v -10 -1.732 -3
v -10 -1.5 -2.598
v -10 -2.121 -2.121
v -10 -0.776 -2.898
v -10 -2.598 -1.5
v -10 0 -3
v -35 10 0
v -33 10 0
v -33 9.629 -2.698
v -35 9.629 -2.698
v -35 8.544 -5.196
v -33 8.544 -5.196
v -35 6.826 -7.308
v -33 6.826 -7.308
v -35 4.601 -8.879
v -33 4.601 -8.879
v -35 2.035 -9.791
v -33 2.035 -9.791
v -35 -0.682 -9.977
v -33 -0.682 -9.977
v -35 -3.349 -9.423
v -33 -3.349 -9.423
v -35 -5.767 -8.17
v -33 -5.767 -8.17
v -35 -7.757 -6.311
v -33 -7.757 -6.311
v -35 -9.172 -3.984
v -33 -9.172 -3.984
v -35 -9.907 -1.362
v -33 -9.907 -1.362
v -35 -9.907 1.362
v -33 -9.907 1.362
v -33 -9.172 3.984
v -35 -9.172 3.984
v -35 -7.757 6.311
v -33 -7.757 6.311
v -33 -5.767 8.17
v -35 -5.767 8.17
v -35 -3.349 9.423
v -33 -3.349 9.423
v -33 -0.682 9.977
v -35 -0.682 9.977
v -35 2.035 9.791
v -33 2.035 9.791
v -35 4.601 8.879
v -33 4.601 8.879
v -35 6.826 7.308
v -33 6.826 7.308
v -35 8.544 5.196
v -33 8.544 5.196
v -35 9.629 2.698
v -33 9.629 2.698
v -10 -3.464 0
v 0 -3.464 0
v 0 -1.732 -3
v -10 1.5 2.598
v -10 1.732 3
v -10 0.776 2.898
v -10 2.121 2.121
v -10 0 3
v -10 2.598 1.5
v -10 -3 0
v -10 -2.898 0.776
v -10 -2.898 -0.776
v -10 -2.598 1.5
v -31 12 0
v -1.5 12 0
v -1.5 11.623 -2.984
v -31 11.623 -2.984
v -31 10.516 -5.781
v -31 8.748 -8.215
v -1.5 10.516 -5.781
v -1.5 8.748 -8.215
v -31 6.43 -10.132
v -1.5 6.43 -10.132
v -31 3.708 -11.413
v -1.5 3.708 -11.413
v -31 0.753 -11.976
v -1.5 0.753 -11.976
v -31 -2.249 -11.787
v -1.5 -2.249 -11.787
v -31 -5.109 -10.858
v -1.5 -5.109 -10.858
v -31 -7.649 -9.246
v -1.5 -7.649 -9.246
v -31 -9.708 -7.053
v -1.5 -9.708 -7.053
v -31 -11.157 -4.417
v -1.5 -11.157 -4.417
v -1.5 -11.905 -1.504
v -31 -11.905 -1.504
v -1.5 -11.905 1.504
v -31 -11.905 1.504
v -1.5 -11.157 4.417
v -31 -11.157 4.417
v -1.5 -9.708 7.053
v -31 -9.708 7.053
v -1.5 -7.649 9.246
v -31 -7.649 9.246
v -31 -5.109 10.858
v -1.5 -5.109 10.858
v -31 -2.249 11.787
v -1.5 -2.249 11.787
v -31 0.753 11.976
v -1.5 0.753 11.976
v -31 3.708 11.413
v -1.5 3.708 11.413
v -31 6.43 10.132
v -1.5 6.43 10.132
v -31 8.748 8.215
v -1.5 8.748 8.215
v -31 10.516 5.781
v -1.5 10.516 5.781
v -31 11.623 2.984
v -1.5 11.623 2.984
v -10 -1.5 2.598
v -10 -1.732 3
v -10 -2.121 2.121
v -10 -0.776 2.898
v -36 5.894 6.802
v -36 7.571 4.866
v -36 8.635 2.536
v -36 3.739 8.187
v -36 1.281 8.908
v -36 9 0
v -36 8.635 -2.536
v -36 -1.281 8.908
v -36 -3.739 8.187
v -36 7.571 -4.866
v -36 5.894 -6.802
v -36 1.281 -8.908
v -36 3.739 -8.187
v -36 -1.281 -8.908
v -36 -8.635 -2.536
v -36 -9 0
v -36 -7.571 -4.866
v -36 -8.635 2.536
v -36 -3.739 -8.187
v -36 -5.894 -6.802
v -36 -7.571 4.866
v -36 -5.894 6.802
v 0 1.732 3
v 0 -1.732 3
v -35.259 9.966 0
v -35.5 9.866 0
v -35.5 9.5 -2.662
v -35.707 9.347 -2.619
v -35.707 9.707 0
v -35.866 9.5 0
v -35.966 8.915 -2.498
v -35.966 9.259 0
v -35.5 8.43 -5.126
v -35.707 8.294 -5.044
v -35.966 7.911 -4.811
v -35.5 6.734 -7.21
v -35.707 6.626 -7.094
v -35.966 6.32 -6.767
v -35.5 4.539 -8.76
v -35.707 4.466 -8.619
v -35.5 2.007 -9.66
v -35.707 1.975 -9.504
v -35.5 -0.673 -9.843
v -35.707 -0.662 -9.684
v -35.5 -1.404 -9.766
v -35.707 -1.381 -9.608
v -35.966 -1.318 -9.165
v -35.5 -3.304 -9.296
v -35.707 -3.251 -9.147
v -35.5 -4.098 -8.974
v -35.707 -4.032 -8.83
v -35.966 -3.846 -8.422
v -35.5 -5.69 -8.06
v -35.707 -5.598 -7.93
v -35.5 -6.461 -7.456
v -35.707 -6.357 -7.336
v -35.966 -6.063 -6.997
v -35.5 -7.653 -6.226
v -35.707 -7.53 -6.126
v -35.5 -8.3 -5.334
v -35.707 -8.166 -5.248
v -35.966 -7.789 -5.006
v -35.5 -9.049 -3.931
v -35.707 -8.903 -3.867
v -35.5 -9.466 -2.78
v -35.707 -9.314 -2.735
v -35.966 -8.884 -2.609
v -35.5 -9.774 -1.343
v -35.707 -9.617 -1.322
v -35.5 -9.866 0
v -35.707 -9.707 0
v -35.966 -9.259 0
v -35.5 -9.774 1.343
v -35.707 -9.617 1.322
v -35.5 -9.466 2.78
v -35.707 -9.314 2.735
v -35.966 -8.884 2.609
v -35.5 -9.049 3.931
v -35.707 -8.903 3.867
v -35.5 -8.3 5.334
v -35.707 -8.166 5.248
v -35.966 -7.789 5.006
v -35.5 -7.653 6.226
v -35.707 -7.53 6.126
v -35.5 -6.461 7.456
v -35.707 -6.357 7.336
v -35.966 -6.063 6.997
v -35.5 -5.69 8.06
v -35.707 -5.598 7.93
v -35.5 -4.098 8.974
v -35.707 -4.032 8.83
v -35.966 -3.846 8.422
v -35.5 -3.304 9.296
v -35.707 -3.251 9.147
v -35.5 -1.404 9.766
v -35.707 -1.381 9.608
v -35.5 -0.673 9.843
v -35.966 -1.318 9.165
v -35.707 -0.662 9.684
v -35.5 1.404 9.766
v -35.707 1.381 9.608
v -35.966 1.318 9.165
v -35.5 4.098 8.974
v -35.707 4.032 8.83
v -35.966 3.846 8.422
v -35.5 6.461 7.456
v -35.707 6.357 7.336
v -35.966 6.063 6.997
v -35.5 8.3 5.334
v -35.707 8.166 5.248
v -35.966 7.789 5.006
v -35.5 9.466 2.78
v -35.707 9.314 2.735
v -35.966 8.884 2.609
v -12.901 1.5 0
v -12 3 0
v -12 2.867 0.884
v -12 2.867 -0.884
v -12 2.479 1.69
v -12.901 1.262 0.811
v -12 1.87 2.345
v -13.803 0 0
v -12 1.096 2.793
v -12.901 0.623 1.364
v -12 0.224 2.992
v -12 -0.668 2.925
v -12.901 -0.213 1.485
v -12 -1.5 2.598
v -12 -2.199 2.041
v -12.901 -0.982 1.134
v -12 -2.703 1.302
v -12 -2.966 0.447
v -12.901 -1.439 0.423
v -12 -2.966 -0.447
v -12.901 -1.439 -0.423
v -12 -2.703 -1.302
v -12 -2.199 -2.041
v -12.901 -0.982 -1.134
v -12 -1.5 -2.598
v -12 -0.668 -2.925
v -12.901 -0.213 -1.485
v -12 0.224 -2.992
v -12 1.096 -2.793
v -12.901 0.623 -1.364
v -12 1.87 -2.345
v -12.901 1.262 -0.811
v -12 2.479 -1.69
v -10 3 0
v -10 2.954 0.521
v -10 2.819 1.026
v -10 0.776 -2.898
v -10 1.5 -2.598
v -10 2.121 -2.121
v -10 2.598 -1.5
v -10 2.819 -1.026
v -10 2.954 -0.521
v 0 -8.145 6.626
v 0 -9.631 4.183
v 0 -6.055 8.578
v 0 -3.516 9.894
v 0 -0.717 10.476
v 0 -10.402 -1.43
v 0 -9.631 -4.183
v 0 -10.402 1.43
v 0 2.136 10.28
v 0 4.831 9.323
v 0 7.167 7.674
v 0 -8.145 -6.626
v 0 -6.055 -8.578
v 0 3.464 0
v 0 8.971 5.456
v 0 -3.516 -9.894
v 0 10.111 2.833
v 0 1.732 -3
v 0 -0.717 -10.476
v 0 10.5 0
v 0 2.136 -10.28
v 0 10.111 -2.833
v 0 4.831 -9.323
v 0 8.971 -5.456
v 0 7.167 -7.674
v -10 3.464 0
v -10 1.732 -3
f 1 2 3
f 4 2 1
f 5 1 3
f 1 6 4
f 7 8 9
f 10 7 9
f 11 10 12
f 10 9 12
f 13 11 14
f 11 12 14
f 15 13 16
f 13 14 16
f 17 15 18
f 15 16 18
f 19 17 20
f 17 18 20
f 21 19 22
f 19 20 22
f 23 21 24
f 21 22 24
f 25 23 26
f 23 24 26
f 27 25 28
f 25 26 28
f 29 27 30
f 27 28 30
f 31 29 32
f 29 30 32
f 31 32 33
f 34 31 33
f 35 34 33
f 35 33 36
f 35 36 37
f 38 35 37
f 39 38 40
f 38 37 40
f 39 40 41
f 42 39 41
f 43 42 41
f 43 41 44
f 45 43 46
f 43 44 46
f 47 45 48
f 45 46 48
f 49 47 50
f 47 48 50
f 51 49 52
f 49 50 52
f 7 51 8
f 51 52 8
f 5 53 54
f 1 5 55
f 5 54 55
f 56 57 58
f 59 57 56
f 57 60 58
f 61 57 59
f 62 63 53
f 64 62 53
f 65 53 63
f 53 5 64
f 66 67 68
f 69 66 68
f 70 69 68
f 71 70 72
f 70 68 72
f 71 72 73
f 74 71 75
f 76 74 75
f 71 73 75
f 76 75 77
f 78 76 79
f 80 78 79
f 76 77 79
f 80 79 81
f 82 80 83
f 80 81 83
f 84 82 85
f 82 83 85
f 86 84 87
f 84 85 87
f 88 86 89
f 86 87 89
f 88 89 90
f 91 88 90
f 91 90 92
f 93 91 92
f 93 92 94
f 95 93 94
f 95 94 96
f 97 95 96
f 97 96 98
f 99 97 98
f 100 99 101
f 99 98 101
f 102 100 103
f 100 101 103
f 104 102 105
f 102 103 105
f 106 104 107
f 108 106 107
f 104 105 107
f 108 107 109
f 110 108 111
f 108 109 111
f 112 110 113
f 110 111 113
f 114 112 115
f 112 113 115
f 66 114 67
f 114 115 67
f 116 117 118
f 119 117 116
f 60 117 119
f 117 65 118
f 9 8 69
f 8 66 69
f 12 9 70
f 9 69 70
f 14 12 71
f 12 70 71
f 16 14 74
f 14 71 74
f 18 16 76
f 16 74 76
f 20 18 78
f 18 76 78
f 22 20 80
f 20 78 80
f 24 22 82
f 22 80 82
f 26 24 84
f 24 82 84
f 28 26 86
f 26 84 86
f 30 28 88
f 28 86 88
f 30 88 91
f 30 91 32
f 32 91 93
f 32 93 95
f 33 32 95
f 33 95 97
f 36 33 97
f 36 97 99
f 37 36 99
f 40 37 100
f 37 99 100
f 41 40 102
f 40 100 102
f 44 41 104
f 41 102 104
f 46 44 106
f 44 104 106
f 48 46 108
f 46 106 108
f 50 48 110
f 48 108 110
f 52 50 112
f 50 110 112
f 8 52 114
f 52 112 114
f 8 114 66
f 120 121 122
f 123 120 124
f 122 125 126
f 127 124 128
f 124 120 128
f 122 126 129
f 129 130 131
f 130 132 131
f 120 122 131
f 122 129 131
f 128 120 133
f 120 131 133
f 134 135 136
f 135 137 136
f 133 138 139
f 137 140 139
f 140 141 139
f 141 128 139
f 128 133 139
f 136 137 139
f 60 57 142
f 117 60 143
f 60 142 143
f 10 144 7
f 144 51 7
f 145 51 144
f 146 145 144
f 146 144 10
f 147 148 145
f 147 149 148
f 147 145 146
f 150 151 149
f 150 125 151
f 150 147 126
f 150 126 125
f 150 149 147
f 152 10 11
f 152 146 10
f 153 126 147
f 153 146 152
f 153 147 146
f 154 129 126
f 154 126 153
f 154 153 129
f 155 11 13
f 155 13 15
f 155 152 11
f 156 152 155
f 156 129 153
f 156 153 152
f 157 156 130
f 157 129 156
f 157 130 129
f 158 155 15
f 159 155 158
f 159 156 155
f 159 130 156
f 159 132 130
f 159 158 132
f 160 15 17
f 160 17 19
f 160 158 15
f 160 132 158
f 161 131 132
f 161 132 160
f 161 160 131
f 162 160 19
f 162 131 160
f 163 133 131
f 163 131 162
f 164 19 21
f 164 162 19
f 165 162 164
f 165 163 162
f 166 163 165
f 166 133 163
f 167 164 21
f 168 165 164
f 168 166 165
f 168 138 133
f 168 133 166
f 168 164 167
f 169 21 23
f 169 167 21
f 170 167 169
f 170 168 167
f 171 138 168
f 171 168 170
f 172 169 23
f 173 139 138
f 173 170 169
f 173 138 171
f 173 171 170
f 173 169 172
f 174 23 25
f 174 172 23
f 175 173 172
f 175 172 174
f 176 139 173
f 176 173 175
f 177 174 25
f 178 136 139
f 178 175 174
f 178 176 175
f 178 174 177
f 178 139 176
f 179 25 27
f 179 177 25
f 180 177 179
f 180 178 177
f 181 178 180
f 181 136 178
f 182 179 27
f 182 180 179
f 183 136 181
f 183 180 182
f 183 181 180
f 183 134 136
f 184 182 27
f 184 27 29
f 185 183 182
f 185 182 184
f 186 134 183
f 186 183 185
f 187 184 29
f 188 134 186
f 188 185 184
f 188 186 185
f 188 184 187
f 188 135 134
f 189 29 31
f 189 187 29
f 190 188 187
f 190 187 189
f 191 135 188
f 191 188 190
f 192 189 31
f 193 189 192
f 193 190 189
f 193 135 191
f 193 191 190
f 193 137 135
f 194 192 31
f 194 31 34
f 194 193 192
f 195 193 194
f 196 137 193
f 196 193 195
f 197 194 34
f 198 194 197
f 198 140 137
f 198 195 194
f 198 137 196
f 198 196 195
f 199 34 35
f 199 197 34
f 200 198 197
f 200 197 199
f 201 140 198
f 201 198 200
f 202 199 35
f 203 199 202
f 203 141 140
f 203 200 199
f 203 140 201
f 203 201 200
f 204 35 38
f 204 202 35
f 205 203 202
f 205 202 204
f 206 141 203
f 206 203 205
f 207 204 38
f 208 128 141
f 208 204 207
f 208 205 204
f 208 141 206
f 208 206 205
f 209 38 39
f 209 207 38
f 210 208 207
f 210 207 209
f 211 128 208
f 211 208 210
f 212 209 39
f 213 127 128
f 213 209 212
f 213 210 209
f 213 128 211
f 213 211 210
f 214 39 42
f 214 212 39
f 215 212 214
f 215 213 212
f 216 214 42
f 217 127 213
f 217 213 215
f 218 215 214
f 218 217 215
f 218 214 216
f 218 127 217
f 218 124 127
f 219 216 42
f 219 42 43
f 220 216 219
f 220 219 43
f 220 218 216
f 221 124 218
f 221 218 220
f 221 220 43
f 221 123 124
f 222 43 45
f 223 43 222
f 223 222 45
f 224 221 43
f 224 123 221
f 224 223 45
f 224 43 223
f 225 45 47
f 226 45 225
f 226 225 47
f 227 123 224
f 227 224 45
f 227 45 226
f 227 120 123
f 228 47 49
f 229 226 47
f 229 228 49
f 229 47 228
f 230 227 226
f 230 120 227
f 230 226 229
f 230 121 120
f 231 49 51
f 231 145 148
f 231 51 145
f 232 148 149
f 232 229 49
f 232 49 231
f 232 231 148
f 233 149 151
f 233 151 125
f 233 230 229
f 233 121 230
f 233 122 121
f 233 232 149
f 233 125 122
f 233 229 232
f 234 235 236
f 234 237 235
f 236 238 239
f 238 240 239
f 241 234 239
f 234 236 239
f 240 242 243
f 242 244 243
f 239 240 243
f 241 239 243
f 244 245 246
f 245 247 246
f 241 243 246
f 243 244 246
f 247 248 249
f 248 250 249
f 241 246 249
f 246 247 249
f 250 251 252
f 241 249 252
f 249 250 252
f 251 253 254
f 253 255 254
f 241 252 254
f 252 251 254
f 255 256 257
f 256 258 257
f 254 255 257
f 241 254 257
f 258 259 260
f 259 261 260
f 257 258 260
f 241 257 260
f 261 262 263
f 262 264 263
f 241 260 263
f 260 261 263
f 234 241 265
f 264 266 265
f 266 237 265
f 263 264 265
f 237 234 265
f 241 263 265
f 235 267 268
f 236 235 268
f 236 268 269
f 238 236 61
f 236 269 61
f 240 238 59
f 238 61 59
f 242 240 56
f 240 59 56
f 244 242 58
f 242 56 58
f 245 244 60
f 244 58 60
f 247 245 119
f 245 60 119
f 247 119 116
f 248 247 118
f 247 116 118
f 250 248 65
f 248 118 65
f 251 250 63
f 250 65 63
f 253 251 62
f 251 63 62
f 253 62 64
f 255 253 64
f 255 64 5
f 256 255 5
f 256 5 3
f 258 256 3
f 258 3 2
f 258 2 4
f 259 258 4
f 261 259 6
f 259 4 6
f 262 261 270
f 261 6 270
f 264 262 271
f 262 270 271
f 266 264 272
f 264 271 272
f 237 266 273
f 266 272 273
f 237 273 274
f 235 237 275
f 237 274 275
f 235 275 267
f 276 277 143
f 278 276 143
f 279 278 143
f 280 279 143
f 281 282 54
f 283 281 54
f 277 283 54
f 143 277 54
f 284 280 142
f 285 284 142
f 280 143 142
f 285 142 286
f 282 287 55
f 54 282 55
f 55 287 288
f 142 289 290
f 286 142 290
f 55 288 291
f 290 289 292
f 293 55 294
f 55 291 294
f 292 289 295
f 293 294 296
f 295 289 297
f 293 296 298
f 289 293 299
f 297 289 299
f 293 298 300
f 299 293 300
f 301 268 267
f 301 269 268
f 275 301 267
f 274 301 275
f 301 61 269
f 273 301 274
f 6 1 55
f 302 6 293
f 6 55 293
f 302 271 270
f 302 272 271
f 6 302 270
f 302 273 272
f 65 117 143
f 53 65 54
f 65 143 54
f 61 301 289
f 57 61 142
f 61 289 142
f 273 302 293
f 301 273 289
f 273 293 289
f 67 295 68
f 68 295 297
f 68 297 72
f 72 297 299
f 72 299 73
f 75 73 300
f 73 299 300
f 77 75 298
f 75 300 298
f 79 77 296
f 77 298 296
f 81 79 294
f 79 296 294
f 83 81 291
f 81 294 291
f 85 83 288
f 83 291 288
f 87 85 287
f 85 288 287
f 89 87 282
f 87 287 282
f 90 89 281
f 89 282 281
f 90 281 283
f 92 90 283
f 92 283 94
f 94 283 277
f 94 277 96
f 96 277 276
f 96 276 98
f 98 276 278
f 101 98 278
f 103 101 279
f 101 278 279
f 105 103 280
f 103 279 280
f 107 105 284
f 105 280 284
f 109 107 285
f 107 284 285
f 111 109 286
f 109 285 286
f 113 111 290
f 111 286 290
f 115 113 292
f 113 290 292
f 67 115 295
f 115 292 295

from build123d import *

# Parameters (mm, degrees)
CHAMFER1_SIZE  = 1.5
R1_RUNDING_R   = 1
SEKSKANT_DEPTH = 10


# Read off the part's stored shape, not the designer's step: Hul for sekskant
with BuildPart() as part:
    # Sketch1 → Base-Revolve (revolve)
    with BuildSketch(Plane.XY):
        Polygon((-36, 0), (-36, 10), (-33, 10), (-31, 12), (0, 12), (0, 0), align=None)
    revolve(axis=Axis((2, 0, 0), (-1, 0, 0)))

    # Chamfer1
    chamfer1_edges = [part.edges().sort_by_distance(p)[0] for p in [
        (0, -12, 0),
    ]]
    chamfer(chamfer1_edges, length=CHAMFER1_SIZE)

    # R1 runding
    r1_runding_edges = [part.edges().sort_by_distance(p)[0] for p in [
        (-36, -10, 0),
    ]]
    fillet(r1_runding_edges, radius=R1_RUNDING_R)

    # Hul for sekskant outline → Hul for sekskant (revolve, cut)
    with BuildSketch(Plane.YX):
        Polygon((0, 0), (0, -13.802581857), (3, -12), (3, 0), align=None)
    revolve(axis=Axis((0, 0, 0), (1, 0, 0)), mode=Mode.SUBTRACT)

    # Sketch8 → Sekskant (cut)
    with BuildSketch(Plane(origin=(0, 0, 0), x_dir=(0, 0, -1), z_dir=(1, 0, 0))):
        Polygon((-3, -1.732050808), (0, -3.464101615), (3, -1.732050808), (3, 1.732050808), (0, 3.464101615), (-3, 1.732050808), align=None)
    extrude(amount=-SEKSKANT_DEPTH, mode=Mode.SUBTRACT)


solid = part.part
